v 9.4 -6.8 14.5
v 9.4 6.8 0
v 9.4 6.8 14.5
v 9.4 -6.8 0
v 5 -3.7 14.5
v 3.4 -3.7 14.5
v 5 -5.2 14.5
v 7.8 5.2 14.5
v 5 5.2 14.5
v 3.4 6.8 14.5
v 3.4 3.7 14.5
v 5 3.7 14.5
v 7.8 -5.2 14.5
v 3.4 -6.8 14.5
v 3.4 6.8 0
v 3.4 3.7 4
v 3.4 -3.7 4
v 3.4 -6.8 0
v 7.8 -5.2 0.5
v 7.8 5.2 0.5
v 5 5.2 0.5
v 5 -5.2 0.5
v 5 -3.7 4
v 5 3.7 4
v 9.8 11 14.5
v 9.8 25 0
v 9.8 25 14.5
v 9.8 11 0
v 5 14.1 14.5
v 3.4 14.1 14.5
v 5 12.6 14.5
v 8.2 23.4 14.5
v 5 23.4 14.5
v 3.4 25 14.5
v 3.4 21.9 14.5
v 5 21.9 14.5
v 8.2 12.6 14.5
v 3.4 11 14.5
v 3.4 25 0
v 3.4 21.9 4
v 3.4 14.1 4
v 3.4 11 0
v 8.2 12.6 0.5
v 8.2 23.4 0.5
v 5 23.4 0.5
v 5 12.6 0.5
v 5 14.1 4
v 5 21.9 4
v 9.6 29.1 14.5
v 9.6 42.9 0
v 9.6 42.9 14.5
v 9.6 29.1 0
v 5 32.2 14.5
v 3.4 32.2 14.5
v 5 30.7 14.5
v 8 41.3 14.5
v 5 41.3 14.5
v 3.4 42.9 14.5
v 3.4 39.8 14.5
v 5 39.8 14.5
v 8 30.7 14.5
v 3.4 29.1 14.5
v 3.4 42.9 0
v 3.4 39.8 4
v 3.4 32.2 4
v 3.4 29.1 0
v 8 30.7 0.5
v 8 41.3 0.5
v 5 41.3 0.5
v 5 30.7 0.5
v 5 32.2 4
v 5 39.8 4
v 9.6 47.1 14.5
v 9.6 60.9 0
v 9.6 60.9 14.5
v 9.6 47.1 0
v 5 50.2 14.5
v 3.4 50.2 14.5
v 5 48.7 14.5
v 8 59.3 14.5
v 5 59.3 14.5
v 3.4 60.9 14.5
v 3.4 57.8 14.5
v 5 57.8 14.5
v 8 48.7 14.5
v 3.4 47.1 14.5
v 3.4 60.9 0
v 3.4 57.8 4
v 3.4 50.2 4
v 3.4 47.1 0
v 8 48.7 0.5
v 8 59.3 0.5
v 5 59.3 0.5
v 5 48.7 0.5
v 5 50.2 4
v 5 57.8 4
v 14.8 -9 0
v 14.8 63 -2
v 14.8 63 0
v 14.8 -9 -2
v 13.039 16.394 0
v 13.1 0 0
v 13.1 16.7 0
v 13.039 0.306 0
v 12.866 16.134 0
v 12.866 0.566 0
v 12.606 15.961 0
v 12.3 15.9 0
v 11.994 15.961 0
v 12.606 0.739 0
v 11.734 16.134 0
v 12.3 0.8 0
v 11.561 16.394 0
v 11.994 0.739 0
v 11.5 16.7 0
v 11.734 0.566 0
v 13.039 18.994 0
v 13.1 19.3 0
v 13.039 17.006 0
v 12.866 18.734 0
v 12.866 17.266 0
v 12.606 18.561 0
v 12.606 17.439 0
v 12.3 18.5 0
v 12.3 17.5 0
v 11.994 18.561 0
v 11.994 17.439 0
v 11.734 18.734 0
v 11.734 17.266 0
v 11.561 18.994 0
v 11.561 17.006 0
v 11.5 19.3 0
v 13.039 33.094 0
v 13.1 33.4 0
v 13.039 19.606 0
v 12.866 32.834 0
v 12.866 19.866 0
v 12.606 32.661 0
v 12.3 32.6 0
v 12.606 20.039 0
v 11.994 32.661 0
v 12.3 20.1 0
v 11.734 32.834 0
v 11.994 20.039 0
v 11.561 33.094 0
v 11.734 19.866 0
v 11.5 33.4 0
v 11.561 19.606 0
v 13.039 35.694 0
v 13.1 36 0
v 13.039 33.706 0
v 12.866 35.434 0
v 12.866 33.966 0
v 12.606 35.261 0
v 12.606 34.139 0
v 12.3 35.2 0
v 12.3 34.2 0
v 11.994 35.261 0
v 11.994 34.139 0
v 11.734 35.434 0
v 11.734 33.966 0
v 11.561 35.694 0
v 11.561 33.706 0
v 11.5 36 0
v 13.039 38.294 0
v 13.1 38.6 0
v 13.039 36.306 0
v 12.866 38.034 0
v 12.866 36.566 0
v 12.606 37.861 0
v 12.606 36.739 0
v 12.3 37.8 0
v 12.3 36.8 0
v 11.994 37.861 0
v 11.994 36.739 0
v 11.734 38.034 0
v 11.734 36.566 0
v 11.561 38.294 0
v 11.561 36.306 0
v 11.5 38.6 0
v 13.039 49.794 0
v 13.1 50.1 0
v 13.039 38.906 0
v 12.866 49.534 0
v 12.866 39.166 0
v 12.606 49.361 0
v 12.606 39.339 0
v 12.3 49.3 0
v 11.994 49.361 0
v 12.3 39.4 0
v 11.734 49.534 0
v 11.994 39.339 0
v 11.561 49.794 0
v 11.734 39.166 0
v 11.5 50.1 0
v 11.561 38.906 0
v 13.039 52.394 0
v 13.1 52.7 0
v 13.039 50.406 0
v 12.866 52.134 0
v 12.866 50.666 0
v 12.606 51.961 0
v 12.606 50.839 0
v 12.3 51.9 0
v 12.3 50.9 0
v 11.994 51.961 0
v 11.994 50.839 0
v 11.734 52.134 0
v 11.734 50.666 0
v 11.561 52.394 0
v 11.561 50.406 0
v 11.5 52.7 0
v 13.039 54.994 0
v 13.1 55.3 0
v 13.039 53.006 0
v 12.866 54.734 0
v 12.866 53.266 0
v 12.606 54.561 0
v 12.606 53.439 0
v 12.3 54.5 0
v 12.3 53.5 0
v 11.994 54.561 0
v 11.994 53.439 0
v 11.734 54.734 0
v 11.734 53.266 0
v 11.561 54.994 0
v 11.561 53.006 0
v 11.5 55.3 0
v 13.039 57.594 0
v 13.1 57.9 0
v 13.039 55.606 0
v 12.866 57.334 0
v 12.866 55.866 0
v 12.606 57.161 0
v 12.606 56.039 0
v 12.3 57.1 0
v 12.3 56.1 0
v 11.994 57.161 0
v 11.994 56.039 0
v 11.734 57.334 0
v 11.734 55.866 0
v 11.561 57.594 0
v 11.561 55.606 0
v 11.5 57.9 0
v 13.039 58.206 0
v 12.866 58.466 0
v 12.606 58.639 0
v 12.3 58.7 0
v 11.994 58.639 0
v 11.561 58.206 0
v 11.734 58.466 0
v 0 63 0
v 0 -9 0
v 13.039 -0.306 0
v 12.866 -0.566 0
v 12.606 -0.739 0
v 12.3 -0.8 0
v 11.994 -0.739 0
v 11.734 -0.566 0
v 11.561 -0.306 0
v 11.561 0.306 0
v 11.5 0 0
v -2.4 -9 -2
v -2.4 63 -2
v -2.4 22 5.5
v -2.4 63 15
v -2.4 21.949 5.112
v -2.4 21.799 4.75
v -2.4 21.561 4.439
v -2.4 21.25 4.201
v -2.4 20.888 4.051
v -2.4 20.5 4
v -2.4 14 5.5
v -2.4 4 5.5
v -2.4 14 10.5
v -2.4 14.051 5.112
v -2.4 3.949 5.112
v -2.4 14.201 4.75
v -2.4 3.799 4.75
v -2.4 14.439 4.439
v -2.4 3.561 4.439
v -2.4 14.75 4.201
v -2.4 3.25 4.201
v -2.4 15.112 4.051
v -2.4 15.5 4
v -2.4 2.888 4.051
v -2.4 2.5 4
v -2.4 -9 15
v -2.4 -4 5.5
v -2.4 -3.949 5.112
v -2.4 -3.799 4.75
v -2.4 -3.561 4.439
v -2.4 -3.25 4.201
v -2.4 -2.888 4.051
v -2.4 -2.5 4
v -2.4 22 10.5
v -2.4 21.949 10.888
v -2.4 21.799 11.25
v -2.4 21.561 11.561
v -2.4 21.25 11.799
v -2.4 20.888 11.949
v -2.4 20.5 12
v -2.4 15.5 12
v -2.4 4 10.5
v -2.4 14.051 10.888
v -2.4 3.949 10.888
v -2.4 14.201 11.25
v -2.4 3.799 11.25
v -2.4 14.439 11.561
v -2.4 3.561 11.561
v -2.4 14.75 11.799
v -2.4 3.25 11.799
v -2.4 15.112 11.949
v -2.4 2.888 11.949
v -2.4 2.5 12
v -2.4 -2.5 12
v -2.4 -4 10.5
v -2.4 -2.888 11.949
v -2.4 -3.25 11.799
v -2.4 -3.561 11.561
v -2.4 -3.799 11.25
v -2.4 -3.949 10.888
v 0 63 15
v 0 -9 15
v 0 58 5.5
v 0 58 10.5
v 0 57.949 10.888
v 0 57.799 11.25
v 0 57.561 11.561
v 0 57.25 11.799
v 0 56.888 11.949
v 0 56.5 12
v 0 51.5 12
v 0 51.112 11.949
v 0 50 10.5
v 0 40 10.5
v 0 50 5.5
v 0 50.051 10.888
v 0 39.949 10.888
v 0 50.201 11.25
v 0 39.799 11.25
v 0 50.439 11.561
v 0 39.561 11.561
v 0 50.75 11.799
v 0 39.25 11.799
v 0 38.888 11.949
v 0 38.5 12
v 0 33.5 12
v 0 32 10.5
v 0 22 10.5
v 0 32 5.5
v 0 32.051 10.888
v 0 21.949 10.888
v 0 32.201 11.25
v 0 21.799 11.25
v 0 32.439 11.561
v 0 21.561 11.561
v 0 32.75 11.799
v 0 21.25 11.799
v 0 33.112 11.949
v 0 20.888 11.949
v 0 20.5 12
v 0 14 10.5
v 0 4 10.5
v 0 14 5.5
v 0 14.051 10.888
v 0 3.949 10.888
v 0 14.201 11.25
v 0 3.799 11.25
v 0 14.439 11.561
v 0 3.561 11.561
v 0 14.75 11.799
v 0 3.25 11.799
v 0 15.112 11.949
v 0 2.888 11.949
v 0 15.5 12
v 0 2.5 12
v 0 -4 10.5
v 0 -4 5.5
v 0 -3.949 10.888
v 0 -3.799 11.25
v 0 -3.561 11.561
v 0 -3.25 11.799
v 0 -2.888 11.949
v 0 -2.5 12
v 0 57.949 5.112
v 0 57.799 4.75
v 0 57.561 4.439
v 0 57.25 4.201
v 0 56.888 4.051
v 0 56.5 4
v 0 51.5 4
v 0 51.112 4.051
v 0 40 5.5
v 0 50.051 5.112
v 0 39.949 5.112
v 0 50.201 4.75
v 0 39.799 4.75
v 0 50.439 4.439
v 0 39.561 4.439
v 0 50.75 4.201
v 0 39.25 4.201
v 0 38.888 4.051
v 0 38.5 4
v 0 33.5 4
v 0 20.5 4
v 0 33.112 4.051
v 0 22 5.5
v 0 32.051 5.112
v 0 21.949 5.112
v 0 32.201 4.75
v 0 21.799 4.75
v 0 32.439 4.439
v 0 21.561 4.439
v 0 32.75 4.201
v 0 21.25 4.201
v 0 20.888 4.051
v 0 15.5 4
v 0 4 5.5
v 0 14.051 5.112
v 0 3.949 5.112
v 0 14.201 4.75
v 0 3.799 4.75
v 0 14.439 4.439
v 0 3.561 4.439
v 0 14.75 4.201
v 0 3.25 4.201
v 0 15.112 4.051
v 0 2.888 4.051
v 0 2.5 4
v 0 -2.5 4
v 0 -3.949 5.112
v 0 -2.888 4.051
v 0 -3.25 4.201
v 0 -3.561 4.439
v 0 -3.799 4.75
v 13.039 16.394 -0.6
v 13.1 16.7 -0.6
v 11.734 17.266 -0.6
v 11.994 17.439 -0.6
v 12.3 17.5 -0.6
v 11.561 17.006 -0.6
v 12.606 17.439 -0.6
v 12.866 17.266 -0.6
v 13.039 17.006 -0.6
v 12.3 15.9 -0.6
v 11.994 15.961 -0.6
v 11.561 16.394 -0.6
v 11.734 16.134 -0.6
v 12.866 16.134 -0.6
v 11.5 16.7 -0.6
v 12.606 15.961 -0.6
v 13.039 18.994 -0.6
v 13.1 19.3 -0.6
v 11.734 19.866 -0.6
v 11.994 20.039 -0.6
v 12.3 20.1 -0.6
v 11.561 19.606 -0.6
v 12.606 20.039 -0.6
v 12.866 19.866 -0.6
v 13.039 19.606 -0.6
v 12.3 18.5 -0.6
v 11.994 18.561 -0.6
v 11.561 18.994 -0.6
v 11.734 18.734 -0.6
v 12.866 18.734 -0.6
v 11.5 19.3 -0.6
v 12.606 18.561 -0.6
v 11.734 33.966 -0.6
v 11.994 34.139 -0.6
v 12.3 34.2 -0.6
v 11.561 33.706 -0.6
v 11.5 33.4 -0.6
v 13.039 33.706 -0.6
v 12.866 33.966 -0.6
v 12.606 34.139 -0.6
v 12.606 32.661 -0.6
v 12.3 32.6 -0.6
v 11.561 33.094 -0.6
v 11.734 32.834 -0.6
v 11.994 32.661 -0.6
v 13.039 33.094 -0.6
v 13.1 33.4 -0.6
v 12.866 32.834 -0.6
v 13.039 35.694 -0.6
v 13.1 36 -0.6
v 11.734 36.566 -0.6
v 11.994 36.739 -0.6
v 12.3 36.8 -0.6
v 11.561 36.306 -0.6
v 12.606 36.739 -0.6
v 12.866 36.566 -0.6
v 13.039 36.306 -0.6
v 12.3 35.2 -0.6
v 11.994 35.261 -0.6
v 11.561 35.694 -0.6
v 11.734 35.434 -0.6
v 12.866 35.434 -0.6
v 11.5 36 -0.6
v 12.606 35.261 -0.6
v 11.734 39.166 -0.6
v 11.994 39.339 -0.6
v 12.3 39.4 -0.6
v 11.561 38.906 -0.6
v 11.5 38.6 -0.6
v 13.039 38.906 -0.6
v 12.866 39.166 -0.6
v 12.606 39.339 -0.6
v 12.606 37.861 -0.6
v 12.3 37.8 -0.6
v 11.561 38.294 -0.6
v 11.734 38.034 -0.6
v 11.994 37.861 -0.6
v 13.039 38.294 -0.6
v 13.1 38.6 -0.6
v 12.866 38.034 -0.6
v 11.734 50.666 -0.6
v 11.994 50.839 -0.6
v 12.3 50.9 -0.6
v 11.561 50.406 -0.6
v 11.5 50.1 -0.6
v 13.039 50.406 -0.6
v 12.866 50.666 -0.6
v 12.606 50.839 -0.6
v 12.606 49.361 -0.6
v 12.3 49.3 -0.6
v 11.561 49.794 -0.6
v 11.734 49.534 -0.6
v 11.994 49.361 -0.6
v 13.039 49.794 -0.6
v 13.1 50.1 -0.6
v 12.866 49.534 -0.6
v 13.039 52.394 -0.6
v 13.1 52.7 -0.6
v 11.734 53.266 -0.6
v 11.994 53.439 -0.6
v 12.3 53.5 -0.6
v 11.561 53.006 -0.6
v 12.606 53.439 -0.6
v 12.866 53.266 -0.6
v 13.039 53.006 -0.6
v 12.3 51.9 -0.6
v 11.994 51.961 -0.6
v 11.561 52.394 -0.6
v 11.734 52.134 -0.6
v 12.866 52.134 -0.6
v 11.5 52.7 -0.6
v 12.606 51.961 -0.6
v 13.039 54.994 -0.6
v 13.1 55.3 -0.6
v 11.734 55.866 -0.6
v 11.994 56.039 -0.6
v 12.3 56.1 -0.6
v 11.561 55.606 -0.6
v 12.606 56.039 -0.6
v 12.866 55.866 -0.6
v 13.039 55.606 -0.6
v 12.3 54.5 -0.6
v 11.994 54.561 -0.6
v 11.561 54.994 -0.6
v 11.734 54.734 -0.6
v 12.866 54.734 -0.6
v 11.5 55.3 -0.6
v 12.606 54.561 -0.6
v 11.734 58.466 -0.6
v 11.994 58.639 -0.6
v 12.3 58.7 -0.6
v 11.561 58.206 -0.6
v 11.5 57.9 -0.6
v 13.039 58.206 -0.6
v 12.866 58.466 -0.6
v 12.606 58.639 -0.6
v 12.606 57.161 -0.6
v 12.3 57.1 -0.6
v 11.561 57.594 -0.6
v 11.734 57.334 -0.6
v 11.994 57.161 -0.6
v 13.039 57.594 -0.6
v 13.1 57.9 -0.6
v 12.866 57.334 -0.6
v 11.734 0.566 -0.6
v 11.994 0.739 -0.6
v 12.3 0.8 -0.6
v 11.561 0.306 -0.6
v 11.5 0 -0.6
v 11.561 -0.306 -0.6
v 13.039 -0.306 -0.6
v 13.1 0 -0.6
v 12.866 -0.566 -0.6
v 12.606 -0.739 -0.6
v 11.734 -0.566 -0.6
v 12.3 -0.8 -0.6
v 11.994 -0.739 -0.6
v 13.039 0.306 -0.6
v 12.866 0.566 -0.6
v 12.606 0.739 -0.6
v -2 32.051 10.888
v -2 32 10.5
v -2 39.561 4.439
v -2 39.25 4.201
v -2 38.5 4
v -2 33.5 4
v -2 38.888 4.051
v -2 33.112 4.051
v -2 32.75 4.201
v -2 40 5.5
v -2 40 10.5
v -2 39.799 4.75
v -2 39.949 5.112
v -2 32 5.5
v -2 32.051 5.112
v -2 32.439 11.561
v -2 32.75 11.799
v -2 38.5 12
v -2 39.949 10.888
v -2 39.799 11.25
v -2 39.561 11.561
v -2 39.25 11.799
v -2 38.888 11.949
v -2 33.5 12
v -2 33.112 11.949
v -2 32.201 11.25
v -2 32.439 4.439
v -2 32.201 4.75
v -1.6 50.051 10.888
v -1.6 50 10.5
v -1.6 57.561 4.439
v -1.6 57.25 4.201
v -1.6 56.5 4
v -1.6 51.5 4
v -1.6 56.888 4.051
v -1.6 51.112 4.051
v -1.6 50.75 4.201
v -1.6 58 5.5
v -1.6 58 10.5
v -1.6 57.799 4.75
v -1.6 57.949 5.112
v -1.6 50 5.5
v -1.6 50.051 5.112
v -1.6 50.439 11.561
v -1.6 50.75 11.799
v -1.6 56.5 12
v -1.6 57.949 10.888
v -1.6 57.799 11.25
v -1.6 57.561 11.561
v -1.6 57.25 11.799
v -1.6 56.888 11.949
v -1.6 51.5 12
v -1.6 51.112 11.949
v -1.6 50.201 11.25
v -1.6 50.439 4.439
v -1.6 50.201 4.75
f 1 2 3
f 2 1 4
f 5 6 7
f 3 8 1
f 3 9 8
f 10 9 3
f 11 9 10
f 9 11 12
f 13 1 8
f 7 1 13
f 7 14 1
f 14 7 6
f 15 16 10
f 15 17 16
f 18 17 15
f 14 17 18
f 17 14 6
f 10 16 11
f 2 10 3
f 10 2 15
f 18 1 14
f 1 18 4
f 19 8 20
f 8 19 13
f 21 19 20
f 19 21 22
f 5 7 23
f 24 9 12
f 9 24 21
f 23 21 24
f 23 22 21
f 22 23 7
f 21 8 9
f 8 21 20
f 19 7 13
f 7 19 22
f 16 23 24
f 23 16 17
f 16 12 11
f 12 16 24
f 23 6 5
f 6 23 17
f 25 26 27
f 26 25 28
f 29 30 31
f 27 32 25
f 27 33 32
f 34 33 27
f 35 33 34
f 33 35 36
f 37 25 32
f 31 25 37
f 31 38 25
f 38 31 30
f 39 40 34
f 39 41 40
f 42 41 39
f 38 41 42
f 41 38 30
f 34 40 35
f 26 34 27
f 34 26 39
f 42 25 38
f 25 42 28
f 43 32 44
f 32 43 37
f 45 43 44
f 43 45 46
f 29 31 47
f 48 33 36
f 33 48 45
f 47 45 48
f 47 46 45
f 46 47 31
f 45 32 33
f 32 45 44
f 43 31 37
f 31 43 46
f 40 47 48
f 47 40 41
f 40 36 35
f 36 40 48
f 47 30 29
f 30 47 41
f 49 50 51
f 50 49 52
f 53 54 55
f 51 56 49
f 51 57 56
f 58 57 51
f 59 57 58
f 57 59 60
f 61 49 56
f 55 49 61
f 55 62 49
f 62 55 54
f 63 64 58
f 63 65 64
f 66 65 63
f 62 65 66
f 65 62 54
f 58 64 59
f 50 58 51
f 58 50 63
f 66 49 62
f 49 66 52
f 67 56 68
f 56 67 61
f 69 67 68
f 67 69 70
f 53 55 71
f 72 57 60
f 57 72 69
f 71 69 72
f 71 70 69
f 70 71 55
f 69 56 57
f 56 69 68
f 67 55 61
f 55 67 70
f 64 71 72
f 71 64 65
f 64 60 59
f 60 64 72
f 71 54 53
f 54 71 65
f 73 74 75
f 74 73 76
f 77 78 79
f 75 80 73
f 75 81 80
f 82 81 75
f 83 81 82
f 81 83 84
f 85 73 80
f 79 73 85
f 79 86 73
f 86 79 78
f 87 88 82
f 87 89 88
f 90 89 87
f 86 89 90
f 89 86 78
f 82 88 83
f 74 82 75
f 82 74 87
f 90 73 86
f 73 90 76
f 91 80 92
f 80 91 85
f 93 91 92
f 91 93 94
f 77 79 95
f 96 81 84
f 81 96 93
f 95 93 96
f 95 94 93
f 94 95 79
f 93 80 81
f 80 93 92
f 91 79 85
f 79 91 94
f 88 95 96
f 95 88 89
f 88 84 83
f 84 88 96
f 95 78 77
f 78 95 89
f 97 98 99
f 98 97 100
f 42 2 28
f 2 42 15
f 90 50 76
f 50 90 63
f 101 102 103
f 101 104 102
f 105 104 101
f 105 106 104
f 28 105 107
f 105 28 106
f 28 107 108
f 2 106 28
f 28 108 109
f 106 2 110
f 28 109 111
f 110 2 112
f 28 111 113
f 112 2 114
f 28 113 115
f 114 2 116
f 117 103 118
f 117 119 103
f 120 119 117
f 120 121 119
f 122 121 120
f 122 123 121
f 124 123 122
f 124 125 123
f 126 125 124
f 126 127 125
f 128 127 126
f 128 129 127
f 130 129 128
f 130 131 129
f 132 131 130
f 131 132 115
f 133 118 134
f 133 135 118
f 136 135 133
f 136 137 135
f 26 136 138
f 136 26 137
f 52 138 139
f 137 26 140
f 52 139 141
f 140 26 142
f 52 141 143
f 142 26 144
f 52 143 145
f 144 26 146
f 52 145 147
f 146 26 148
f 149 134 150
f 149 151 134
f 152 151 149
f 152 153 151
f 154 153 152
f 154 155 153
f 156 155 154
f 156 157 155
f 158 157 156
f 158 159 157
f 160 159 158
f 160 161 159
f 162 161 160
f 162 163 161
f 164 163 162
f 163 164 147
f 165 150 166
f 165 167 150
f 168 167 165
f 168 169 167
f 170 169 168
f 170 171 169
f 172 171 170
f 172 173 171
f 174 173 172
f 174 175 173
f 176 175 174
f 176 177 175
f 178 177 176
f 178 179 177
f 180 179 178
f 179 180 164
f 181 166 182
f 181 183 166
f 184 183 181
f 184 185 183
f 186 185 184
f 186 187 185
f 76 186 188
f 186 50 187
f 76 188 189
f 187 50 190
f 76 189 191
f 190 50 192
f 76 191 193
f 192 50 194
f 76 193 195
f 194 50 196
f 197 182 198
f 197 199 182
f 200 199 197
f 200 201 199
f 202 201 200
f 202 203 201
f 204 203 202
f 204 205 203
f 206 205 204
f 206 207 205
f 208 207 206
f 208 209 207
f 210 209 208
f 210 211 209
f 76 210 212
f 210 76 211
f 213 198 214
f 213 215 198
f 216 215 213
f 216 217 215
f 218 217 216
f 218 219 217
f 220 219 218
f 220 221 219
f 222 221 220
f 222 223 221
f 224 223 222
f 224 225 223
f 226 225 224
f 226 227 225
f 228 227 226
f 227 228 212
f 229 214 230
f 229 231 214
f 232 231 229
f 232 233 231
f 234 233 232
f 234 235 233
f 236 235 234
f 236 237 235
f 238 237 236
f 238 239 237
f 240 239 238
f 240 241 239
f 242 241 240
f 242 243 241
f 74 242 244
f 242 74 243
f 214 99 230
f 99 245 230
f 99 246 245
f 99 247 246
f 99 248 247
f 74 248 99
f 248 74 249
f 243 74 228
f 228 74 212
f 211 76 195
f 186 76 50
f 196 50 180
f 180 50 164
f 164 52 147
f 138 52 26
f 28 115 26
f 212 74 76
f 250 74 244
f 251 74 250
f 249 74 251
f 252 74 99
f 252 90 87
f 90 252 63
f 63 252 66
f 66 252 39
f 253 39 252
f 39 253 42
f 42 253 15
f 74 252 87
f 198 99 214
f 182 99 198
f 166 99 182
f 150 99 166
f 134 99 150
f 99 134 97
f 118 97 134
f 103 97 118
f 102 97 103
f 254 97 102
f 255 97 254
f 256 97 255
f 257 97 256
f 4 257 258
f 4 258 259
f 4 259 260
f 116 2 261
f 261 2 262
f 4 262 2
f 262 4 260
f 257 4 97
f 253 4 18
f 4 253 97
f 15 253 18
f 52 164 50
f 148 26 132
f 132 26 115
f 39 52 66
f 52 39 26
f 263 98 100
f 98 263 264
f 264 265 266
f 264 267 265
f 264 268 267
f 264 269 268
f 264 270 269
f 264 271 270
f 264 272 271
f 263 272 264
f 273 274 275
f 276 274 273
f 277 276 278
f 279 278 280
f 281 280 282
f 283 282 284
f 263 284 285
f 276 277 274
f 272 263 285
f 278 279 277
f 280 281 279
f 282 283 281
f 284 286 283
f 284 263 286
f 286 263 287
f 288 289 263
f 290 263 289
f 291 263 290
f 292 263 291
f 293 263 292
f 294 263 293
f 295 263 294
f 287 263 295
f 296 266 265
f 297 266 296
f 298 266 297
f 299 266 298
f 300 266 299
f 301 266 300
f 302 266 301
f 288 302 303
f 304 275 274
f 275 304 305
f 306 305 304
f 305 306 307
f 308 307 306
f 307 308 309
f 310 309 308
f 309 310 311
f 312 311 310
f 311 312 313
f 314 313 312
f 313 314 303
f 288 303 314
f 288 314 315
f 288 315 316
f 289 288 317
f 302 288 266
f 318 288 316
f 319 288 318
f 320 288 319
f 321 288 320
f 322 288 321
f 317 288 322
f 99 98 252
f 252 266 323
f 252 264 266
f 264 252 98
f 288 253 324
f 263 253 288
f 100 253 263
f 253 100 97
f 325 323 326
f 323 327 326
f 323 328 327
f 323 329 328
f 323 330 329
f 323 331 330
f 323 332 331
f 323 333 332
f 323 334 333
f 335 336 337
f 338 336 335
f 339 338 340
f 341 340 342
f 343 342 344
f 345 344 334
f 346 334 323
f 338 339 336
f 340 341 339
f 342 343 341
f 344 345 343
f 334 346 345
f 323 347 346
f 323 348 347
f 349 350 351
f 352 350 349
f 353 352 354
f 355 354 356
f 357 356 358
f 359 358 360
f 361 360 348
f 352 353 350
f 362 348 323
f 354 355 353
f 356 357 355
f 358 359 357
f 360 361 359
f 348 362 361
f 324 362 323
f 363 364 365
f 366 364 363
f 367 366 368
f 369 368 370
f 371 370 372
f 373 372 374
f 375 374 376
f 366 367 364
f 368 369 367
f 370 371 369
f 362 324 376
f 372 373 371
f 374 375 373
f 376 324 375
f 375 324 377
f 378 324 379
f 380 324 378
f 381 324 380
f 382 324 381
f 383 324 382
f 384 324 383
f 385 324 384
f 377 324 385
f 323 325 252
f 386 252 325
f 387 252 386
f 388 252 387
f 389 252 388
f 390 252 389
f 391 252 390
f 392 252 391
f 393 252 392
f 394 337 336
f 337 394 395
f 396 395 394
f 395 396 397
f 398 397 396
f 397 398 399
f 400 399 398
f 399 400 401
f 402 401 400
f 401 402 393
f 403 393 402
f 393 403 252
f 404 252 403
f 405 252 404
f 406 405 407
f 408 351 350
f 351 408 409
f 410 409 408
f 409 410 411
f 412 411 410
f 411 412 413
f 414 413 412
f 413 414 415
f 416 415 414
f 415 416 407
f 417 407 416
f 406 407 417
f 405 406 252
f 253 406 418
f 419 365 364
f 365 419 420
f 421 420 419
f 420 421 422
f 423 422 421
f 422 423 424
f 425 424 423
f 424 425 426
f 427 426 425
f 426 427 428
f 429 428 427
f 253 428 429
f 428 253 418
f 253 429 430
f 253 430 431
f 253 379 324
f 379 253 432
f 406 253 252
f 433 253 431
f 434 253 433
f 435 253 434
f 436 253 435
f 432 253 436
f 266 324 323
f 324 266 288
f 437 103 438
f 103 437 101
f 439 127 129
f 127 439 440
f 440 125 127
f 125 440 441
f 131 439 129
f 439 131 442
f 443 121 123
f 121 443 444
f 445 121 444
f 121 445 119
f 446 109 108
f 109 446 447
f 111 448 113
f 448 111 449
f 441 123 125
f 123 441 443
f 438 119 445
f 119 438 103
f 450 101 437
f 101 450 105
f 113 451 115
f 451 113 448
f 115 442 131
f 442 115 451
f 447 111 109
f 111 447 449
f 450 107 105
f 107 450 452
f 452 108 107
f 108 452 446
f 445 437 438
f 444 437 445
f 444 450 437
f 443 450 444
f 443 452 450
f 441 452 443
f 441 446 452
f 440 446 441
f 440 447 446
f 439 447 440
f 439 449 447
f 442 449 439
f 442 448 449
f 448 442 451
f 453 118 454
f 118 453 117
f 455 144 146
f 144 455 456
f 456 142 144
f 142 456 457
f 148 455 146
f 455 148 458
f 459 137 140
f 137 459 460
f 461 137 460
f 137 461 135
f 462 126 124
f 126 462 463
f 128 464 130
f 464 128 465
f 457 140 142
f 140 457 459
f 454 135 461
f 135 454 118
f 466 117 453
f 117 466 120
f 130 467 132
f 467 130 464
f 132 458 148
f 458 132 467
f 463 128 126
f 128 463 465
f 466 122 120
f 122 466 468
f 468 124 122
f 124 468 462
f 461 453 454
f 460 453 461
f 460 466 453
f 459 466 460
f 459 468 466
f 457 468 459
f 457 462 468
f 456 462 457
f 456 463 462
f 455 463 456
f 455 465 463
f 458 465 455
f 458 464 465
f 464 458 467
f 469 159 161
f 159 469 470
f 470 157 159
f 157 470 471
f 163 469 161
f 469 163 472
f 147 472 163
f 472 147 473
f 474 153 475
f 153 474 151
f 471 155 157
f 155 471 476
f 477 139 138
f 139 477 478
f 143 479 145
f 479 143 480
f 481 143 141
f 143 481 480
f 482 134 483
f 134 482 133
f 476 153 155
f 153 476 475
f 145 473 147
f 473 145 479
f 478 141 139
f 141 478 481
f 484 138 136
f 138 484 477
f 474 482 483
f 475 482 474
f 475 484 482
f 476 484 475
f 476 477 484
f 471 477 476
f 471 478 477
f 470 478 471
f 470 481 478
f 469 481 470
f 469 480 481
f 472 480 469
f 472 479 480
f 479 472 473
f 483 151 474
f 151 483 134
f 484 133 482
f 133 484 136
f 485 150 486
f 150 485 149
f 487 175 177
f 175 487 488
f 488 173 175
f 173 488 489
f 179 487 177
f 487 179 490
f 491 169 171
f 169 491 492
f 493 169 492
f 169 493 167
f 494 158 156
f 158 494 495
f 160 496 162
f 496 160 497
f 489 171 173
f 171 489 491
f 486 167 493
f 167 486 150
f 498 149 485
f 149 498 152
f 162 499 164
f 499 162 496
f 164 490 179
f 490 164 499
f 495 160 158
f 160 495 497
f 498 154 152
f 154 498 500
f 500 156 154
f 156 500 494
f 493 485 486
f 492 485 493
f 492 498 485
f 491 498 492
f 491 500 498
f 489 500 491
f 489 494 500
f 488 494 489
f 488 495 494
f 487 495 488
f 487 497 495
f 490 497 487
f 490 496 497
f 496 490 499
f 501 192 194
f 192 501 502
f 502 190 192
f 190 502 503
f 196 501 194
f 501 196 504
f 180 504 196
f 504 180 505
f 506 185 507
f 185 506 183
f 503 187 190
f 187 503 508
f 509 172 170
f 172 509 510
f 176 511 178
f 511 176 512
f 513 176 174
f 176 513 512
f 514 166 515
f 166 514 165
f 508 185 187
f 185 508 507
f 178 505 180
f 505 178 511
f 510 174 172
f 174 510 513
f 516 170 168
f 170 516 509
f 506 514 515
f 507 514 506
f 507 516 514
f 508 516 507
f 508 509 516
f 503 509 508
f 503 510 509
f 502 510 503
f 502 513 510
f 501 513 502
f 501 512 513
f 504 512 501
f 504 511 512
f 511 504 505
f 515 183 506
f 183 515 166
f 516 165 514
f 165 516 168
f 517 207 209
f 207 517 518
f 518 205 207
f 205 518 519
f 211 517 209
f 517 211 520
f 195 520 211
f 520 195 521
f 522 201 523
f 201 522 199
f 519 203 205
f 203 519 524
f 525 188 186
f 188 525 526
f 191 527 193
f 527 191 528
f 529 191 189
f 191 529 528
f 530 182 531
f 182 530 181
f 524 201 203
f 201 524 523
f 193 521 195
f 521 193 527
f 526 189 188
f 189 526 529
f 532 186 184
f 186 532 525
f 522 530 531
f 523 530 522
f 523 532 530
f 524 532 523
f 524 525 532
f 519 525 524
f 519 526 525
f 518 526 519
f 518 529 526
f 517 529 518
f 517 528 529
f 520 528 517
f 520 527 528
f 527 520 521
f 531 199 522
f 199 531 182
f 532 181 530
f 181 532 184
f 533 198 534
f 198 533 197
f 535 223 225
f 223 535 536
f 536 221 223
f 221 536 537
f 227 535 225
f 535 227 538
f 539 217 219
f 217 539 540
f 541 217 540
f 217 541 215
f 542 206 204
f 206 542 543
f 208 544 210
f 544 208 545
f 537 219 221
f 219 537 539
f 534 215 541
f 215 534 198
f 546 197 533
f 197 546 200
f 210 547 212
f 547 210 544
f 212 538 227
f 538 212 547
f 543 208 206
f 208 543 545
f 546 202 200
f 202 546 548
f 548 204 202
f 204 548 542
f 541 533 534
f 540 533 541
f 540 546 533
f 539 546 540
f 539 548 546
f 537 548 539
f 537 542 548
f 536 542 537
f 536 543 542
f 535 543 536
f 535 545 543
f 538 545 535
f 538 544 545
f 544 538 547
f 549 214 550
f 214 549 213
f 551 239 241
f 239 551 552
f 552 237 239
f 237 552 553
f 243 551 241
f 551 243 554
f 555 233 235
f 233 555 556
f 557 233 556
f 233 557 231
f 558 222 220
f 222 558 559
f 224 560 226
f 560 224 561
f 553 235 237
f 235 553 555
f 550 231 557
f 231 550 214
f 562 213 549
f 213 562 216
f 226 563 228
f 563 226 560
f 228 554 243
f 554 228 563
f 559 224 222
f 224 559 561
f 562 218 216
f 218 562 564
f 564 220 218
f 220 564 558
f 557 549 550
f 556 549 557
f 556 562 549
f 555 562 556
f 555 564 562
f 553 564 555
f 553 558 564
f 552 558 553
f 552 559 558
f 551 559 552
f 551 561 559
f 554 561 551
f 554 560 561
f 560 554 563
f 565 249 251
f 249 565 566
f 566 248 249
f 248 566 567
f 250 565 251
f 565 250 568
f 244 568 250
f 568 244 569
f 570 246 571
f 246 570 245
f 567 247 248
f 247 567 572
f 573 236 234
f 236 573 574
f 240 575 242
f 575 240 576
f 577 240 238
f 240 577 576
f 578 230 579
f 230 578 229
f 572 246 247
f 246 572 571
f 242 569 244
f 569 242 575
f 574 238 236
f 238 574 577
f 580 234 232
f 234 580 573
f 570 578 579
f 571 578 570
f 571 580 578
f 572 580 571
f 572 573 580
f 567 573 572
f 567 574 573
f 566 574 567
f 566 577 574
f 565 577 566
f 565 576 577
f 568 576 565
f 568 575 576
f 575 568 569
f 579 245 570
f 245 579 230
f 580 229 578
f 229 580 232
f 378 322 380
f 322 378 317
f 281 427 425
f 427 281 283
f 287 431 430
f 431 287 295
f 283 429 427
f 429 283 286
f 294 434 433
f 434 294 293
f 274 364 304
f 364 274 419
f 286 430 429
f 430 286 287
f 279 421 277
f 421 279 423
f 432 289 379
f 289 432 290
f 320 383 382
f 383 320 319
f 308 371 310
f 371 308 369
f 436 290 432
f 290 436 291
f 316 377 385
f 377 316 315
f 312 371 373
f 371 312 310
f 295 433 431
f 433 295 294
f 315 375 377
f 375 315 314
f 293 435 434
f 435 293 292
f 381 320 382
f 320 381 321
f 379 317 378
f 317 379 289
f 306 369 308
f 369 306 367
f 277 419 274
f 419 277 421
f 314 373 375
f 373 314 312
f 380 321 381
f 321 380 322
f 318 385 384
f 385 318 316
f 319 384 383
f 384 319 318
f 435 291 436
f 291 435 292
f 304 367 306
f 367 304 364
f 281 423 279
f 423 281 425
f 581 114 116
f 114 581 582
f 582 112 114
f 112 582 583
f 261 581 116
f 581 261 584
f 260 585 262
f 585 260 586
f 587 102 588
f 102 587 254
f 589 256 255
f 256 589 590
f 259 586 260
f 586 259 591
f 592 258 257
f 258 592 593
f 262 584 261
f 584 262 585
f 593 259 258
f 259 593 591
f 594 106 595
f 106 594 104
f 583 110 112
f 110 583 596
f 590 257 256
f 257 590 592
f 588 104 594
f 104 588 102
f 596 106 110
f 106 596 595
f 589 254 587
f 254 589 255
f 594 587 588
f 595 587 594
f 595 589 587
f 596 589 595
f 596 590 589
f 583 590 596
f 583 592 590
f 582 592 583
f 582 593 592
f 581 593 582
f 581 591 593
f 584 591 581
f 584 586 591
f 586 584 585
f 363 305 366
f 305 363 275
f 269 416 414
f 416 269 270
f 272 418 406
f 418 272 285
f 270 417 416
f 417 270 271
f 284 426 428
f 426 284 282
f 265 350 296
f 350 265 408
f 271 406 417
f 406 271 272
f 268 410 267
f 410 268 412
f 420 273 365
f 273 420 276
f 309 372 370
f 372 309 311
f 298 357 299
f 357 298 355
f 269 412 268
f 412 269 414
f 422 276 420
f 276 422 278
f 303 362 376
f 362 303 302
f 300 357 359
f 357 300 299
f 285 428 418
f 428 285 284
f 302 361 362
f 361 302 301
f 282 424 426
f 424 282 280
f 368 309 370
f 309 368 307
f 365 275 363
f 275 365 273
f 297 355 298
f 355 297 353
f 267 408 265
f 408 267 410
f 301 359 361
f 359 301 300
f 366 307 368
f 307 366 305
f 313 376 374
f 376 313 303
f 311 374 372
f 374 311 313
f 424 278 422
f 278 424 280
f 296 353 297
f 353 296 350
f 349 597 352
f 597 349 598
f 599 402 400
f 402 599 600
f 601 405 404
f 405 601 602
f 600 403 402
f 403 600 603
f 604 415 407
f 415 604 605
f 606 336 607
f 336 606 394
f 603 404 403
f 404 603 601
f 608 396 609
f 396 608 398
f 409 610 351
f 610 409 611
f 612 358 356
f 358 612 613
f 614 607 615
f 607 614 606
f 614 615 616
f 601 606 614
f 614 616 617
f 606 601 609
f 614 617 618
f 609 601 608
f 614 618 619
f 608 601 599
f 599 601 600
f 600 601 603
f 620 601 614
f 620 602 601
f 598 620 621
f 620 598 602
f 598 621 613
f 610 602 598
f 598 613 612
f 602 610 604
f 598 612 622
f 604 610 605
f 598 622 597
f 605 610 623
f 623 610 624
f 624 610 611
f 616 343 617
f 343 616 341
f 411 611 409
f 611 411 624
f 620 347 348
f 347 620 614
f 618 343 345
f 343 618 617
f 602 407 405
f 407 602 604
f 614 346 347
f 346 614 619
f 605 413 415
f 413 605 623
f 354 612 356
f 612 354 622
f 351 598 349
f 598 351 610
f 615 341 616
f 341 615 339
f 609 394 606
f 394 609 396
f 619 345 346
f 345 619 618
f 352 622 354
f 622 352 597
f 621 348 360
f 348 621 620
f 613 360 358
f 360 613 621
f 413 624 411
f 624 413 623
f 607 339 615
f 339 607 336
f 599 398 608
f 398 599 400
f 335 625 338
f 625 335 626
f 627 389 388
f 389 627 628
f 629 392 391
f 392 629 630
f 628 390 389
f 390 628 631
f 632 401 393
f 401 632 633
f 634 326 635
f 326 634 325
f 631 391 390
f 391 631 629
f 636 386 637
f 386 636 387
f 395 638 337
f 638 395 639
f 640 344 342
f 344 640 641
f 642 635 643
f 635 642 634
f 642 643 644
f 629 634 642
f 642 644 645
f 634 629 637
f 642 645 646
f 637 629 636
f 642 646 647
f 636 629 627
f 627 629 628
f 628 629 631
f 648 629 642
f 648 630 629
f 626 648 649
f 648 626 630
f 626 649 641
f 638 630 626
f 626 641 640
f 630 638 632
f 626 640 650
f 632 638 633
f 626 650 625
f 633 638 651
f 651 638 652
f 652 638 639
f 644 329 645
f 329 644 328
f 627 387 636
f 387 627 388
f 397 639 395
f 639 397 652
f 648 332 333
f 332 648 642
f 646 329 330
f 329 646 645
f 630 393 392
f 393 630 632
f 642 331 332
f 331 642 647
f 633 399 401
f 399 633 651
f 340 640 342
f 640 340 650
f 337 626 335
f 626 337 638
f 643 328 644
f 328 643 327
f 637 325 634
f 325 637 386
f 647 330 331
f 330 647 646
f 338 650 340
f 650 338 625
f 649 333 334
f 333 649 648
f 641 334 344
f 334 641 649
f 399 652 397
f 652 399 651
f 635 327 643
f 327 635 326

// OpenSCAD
// file: ../../util/marks.scad
//-----------------------------------------------------------------------
// Marks for fit pieces: n dots in a row, engraved into a face, so each
// variant can be told apart after printing. Origin: centre of the row, on
// the face; the dots cut down into -Z. Units: mm.
//-----------------------------------------------------------------------

markDotDia   = 1.6;
markDotPitch = 2.6;
markDotDepth = 0.6;

module markDots(n)
{
  for (i = [0 : n - 1])
    translate([(i - (n - 1)/2)*markDotPitch, 0, -markDotDepth])
      cylinder(d = markDotDia, h = markDotDepth + 1, $fn = 16);
}
// main file
//-----------------------------------------------------------------------
// Fit piece: a strip of wall with four strip holders and their windows,
// marked 1 to 4 dots behind each. Drop the 15 long piece of 10 mm, 100/m
// strip into each slot, LED to the wall. Light it and look from outside.
//
//   1  slot clearance 0.2, open window
//   2  slot clearance 0.4, open window
//   3  slot clearance 0.3, diffuser skin 0.4
//   4  slot clearance 0.3, diffuser skin 0.8
//
// Prints base down, as exported, no supports: the skins are thin upright
// walls at the wall's outer face. Units: mm.
//-----------------------------------------------------------------------

use <neopixel-strip.scad>
use <../../util/marks.scad>

name      = "10mm-100";
coat      = "ip30";
length    = 15;      // the piece in hand, measured
wall      = 2.4;     // the project's wall: test at the thickness you'll use
axisZ     = 8;       // LED centre above the floor
baseThick = 2.0;
pitch     = 18;

stations  = [ [0.2, "open", 0], [0.4, "open", 0], [0.3, "skin", 0.4], [0.3, "skin", 0.8] ];   // [clearance, window, skin]

n      = len(stations);
depth  = wall + 5 + npxThick(coat) + 0.8 + 1.6 + 5;     // wall, gap, slot, back, room for the dots
wallH  = axisZ + 8/2 + 3;

difference()
{
  union()
  {
    translate([-wall, -pitch/2, -baseThick]) cube([depth, n*pitch, baseThick]);
    translate([-wall, -pitch/2, 0]) cube([wall, n*pitch, wallH]);
    for (i = [0 : n - 1])
      translate([0, i*pitch, 0]) npxHolder(axisZ, name, length = length, coat = coat, clearance = stations[i][0]);
  }
  for (i = [0 : n - 1])
  {
    translate([0, i*pitch, 0]) npxWallCut(axisZ, wall, name, window = stations[i][1], skin = stations[i][2]);
    translate([depth - wall - 2.5, i*pitch, 0]) rotate([0, 0, 90]) markDots(i + 1);
  }
}

if ($preview)
  for (i = [0 : n - 1]) translate([0, i*pitch, 0]) npxGhost(axisZ, name, length = length, coat = coat, clearance = stations[i][0]);
